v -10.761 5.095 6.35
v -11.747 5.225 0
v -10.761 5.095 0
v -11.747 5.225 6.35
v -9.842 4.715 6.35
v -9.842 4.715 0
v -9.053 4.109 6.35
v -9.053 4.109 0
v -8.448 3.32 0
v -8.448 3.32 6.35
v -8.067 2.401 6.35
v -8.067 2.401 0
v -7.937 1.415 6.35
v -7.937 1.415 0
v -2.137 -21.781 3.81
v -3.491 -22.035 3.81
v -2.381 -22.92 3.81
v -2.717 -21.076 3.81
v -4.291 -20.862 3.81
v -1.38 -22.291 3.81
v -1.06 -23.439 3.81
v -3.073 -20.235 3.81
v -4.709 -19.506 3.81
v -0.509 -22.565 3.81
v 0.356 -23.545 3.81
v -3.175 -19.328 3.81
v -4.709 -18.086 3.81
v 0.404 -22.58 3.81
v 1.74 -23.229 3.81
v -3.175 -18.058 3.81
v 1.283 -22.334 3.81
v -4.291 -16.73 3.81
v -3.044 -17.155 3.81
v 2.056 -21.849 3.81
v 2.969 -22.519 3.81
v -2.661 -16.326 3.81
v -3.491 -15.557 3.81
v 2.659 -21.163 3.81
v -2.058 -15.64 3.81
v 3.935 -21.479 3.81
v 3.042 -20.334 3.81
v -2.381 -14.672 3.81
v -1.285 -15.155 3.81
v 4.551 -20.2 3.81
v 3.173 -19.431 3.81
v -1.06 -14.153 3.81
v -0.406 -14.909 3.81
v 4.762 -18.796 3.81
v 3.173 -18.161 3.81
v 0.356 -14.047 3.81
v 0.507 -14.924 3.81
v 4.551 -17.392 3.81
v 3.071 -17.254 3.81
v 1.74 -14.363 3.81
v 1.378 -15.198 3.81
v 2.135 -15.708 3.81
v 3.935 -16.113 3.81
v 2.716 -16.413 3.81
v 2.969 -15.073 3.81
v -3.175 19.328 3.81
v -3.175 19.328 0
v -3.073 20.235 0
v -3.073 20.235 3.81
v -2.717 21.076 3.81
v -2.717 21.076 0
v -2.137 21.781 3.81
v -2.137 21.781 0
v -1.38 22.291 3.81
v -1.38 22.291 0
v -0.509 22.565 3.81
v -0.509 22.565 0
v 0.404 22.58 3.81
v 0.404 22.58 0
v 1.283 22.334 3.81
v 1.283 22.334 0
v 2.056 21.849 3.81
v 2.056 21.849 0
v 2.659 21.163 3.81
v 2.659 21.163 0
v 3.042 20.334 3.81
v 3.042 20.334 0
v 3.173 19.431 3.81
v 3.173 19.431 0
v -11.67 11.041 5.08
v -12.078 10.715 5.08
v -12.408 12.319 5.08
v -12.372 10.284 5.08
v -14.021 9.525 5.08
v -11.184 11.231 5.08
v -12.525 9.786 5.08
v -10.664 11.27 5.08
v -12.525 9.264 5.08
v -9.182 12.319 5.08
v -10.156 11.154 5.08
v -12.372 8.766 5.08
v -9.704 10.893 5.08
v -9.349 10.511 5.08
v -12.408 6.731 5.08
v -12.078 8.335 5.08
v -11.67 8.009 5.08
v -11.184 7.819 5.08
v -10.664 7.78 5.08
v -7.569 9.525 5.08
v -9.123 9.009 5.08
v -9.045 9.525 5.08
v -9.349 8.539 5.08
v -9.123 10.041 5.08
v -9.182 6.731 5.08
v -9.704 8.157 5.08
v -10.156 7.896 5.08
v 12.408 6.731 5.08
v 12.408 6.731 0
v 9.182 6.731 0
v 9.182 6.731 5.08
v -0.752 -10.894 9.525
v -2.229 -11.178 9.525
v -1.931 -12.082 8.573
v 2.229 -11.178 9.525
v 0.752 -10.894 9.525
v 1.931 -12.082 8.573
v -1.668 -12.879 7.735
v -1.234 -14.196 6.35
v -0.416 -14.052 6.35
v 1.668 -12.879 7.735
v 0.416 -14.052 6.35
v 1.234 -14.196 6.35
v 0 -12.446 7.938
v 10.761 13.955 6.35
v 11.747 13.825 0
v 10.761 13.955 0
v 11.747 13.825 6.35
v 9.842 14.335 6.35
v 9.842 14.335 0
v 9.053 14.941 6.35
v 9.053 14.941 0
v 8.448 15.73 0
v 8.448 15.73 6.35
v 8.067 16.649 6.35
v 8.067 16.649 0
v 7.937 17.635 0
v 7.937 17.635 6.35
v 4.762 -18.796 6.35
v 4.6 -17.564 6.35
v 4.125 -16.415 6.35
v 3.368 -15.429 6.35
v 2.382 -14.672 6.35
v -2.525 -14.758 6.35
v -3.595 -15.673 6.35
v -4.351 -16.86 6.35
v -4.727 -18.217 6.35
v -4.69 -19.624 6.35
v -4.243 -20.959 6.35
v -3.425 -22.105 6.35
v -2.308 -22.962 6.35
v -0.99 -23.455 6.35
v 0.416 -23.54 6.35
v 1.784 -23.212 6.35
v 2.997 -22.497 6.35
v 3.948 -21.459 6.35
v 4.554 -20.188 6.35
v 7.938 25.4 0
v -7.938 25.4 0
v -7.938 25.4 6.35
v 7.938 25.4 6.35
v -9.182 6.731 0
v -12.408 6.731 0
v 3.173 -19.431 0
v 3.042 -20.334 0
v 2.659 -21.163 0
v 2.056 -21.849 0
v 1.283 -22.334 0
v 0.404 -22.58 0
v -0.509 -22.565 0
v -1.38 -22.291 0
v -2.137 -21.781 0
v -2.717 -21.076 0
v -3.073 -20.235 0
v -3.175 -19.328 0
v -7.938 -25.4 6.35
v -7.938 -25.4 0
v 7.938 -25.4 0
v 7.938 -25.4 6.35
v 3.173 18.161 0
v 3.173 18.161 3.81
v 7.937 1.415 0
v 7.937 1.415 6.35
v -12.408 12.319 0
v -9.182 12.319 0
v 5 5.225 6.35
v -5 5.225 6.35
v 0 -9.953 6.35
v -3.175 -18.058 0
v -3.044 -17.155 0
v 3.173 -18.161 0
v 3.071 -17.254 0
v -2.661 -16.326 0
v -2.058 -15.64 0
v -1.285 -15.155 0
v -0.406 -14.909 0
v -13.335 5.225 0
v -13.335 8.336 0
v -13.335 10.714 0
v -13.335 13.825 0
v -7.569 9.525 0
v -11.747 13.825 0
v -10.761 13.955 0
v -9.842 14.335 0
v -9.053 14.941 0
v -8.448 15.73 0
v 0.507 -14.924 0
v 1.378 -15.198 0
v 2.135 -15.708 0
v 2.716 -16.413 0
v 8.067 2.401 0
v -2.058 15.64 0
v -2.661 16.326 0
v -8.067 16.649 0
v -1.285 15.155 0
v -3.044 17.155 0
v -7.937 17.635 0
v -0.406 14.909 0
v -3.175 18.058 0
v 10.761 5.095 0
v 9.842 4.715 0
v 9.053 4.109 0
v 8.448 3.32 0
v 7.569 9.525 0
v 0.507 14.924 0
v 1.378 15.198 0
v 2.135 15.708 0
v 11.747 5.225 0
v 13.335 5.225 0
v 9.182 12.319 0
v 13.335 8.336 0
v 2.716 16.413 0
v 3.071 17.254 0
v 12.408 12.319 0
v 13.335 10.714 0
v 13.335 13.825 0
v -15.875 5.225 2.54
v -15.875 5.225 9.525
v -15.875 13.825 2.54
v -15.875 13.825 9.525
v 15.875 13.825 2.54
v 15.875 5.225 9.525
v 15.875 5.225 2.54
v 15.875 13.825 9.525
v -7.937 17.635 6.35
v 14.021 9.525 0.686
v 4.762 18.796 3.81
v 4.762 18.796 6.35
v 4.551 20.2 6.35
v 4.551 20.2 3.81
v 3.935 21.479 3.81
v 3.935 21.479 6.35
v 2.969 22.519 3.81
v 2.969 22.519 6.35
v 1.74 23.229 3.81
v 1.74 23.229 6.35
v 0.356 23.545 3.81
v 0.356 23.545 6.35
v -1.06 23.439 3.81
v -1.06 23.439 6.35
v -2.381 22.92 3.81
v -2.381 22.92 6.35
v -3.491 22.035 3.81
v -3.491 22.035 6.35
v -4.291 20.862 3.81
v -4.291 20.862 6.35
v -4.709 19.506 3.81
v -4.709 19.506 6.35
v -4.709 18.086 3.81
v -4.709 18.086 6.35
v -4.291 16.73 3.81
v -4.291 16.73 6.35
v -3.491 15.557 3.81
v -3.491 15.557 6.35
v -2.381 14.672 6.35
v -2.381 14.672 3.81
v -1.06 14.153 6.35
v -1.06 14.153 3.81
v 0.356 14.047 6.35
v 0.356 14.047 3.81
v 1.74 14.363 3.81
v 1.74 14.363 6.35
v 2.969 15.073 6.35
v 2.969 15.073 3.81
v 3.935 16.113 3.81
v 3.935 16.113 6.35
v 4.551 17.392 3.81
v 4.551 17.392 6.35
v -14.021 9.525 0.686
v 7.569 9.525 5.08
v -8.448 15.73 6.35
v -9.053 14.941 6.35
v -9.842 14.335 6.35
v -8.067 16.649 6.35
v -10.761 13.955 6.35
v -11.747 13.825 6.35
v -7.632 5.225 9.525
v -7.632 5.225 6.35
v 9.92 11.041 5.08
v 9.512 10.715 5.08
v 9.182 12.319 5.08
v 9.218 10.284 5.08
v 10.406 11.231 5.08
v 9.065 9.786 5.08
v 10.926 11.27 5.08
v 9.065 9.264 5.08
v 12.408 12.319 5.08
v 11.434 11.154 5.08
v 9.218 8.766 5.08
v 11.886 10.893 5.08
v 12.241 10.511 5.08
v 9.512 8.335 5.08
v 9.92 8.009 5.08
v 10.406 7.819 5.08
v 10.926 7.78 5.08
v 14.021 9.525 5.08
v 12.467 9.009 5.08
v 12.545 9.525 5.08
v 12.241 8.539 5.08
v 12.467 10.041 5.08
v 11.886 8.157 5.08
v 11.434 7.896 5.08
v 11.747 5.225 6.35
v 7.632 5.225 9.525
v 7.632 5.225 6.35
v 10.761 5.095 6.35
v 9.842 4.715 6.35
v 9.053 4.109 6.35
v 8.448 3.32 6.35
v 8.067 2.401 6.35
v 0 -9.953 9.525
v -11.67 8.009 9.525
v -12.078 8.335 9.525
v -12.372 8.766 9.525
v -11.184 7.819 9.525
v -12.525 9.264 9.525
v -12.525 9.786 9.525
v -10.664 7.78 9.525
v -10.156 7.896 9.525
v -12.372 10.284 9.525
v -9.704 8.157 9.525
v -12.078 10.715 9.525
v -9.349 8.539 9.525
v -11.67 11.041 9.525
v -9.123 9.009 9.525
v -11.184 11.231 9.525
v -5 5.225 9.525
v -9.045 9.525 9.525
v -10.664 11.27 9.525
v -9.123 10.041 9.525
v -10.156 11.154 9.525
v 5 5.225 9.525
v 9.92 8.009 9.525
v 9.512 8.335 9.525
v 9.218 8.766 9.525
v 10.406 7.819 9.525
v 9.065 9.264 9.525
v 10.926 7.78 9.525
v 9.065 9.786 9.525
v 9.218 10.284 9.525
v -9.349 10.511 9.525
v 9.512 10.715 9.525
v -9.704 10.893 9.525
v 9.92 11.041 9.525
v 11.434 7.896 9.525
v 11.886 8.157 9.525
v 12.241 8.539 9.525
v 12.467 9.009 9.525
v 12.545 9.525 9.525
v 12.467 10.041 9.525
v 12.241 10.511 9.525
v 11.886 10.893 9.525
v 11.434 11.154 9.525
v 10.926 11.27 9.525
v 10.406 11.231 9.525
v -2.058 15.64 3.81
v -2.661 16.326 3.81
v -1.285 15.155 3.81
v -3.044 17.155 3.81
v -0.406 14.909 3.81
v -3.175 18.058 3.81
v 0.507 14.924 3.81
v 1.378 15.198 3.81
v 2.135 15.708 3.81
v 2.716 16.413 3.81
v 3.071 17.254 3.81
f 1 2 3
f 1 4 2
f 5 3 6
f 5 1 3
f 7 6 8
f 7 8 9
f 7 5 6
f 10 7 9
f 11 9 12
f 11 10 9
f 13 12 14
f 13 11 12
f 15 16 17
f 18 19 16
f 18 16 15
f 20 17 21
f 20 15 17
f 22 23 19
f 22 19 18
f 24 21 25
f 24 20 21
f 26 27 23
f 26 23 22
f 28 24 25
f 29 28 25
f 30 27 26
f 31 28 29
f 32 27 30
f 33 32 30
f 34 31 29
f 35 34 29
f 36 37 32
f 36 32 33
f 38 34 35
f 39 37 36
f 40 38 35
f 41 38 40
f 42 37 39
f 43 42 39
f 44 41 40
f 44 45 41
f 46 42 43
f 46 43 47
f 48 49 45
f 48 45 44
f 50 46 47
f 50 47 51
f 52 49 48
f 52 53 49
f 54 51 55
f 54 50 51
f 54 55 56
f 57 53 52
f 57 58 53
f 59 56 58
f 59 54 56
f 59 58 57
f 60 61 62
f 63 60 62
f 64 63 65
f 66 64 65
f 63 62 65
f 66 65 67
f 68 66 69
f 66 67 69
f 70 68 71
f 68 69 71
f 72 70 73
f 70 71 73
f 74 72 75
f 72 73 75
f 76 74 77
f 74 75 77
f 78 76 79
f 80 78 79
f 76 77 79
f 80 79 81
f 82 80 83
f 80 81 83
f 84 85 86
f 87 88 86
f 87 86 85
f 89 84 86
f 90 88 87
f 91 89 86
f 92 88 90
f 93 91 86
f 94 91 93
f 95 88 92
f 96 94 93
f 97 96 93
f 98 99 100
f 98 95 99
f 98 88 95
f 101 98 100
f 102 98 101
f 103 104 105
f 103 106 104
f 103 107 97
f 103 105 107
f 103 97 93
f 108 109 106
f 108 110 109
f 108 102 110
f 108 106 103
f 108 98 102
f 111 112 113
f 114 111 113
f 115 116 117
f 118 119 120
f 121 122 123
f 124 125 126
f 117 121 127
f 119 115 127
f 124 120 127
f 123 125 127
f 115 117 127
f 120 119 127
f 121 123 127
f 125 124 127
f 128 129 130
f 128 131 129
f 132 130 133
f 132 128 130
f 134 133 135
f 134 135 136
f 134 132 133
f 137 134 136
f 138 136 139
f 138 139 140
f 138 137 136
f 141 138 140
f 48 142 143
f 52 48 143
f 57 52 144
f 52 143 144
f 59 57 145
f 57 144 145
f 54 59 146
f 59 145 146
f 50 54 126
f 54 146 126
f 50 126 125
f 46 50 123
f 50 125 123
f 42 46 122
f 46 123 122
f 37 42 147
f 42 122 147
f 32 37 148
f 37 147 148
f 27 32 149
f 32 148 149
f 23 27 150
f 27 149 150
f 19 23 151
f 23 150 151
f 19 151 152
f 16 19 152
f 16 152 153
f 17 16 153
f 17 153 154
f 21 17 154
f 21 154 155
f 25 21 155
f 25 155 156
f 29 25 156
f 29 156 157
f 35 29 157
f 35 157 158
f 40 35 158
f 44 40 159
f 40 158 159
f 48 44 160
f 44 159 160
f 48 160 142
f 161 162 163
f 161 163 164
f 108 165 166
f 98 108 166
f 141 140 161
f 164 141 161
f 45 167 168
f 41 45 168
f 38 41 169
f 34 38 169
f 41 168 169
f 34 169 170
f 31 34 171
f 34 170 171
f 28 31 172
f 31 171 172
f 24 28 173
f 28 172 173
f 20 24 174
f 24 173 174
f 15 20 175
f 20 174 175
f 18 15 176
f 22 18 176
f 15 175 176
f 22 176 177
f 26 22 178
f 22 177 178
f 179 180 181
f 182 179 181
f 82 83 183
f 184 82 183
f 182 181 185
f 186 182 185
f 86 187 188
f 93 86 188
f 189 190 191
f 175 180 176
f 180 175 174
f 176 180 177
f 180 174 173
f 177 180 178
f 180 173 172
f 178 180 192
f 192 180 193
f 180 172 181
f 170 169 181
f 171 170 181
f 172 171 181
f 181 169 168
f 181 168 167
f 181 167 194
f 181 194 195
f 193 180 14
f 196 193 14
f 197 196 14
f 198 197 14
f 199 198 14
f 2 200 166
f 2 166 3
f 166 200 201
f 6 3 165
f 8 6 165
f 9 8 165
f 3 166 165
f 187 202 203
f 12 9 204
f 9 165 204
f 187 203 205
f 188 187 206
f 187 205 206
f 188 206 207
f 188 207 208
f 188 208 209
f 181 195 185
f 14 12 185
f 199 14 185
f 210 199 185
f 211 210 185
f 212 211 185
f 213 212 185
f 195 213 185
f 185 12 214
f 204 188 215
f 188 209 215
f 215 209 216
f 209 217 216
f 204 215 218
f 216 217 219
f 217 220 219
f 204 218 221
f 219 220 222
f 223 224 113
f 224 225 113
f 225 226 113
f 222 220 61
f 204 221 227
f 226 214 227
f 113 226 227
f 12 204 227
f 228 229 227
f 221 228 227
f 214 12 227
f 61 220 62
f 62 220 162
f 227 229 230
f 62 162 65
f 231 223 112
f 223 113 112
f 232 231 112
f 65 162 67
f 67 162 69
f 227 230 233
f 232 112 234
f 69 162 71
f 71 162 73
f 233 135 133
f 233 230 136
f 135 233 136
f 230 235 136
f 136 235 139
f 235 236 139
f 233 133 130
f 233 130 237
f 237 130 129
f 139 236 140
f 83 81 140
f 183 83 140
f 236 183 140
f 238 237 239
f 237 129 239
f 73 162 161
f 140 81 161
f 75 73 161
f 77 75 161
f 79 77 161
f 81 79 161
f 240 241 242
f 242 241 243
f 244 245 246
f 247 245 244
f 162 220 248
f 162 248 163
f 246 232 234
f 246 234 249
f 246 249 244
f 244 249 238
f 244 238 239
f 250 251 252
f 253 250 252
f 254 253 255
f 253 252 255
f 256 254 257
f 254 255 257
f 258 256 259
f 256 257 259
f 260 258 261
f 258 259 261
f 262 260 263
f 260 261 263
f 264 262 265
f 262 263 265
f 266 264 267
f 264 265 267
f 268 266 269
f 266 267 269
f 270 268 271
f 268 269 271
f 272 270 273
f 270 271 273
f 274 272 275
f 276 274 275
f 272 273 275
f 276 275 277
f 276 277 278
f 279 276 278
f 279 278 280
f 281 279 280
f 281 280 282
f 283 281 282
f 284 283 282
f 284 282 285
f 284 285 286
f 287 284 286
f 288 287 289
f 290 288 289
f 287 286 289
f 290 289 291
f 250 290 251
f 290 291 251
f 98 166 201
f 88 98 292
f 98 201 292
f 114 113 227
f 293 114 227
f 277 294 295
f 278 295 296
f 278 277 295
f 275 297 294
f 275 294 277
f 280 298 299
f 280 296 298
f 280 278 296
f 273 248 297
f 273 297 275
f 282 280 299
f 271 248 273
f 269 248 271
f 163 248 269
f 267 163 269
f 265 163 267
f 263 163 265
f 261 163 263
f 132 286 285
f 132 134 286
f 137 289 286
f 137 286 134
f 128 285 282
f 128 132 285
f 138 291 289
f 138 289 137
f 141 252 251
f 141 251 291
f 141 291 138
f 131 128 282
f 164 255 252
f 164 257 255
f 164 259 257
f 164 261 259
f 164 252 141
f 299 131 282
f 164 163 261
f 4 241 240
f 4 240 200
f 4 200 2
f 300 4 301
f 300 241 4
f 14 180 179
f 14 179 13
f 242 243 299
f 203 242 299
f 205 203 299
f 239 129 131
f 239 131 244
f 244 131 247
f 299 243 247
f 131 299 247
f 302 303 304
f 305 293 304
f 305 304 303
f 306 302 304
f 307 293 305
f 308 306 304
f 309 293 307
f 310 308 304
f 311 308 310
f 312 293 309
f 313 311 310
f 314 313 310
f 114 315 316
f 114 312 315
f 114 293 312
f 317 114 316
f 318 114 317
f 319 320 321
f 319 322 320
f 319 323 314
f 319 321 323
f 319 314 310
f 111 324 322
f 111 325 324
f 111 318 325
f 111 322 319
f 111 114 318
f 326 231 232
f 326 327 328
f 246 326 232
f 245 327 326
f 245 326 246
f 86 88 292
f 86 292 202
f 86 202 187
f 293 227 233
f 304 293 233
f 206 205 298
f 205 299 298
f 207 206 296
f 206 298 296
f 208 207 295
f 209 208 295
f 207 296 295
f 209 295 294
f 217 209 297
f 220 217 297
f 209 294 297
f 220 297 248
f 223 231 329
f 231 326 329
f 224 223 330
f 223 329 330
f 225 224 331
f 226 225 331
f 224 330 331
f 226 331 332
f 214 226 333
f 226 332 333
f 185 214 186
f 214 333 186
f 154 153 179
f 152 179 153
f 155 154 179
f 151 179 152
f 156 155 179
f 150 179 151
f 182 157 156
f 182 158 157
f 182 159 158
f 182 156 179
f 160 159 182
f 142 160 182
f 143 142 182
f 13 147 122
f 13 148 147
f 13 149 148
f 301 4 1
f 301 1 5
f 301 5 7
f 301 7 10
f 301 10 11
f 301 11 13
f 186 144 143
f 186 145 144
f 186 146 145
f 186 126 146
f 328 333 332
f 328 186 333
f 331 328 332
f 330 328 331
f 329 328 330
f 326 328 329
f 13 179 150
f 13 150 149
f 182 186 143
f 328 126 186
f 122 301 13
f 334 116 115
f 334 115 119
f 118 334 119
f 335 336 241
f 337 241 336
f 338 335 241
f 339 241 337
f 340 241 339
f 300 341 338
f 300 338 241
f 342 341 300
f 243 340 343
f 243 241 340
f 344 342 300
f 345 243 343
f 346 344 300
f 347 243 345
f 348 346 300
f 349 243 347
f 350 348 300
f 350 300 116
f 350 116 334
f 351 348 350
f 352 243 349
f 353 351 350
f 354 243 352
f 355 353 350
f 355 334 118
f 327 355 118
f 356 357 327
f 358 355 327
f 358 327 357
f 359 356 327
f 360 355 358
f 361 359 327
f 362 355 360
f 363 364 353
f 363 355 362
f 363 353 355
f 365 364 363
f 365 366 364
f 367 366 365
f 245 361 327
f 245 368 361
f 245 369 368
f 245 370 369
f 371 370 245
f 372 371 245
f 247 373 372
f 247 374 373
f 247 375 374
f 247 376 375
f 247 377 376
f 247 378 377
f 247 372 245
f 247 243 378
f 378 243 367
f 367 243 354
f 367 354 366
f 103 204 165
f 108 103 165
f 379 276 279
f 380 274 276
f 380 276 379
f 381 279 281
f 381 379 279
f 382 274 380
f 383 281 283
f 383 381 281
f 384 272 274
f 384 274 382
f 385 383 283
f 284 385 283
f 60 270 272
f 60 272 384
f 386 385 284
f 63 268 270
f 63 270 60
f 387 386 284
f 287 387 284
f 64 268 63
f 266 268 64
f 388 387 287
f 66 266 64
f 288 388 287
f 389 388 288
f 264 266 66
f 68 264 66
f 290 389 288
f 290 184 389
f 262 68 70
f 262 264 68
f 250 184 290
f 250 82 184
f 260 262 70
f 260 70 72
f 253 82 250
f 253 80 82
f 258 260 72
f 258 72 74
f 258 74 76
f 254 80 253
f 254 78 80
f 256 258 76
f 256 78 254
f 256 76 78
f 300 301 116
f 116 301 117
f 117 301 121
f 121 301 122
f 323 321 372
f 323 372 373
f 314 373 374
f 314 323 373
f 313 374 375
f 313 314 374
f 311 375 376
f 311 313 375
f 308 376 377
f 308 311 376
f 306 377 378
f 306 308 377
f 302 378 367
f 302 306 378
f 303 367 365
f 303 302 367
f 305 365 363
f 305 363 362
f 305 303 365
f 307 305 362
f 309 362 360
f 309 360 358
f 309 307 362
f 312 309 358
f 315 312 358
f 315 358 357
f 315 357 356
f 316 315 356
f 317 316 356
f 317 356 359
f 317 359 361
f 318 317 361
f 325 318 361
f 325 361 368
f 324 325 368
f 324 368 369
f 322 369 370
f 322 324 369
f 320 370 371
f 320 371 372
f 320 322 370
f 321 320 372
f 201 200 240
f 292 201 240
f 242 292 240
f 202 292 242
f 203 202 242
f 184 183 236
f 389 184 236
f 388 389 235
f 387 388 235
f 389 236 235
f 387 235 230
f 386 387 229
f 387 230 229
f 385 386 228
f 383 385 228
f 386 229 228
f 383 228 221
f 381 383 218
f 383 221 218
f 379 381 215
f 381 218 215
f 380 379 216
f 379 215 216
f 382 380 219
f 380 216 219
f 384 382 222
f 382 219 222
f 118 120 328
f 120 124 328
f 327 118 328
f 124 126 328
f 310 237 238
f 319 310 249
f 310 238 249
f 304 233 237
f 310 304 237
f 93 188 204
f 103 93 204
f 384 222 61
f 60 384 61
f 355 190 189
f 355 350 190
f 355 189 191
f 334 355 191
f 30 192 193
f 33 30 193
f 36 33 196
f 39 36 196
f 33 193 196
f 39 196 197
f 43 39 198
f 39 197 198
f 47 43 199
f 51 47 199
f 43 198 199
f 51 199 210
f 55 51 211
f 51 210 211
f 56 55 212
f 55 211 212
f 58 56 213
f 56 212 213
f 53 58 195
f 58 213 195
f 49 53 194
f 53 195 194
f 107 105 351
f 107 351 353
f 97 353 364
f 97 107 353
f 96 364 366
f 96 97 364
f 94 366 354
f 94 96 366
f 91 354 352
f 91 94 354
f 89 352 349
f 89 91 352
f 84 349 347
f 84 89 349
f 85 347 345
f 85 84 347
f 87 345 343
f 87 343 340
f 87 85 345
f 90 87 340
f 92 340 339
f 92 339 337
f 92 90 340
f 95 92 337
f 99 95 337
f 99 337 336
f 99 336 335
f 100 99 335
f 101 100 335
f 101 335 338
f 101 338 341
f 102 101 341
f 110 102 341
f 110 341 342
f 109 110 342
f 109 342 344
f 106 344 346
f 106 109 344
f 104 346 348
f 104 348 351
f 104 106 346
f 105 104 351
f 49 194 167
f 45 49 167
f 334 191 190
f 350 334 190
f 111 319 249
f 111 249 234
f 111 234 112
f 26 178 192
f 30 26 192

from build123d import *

# Parameters (mm, degrees)
F0_W          = 15.875
F0_H          = 50.8
F1_DEPTH      = 6.35
F2_W          = 31.75
F2_H          = 8.6
F2_R          = 1.75
F3_DEPTH      = 3.175
F3_DEPTH_BACK = 6.35
F4_R          = 4.7625
F5_DEPTH      = 2.54
F6_SIZE       = 2.54
F8_DEPTH      = 5.08
F9_R          = 3.81
F11_DEPTH     = 3.175
F12_SIZE      = 3.17499


# Not quite as in the source:
# - a fillet or chamfer is up to 0.001 mm smaller than in the source, because OpenCascade refuses the exact size


with BuildPart() as f1:
    # F0 (on Top) → F1 (new body)
    with BuildSketch(Plane.XY):
        Rectangle(F0_W, F0_H)
        with BuildLine():
            ThreePointArc((-3.175, -18.058110271), (0.0514516208, -14.8835271912), (3.1733324288, -18.161))
            Line((3.1733324288, -18.161), (3.1733324288, -19.431))
            ThreePointArc((3.1733324288, -19.431), (-0.053119192, -22.6055830798), (-3.175, -19.328110271))
            Line((-3.175, -19.328110271), (-3.175, -18.058110271))
        make_face(mode=Mode.SUBTRACT)
        with BuildLine():
            ThreePointArc((3.1733324288, 18.161), (0.0514516208, 14.8835271912), (-3.175, 18.058110271))
            Line((-3.175, 18.058110271), (-3.175, 19.328110271))
            ThreePointArc((-3.175, 19.328110271), (-0.053119192, 22.6055830798), (3.1733324288, 19.431))
            Line((3.1733324288, 19.431), (3.1733324288, 18.161))
        make_face(mode=Mode.SUBTRACT)
    extrude(amount=F1_DEPTH)

    # F2 (on face) → F3 (join, two sides)
    with BuildSketch(Plane.XY.offset(6.35)) as f3_sk:
        with Locations((0, 9.525)):
            Rectangle(F2_W, F2_H)
        with Locations((-10.795, 9.525)):
            Circle(F2_R, mode=Mode.SUBTRACT)
        with Locations((10.795, 9.525)):
            Circle(F2_R, mode=Mode.SUBTRACT)
    extrude(amount=F3_DEPTH)
    extrude(f3_sk.sketch, amount=-F3_DEPTH_BACK)

    # F4 (on face) → F5 (cut)
    with BuildSketch(Plane.XY.offset(6.35)):
        with Locations((0, -18.796)):
            Circle(F4_R)
        with Locations((0, 18.796)):
            Circle(F4_R)
    extrude(amount=-F5_DEPTH, mode=Mode.SUBTRACT)

    # F6
    f6_edges = [f1.edges().sort_by_distance(p)[0] for p in [
        (-15.875, 9.525, 0),
        (15.875, 9.525, 0),
    ]]
    chamfer(f6_edges, length=F6_SIZE)

    # F7 (on face) → F8 (cut)
    with BuildSketch(Plane(origin=(0, 0, 0), x_dir=(1, 0, 0), z_dir=(0, 0, -1))):
        Polygon((-9.1818833479, -12.319), (-7.5687666958, -9.525), (-9.1818833479, -6.731), (-12.4081166521, -6.731), (-14.0212333042, -9.525), (-12.4081166521, -12.319), align=None)
        Polygon((12.4081166521, -6.731), (9.1818833479, -6.731), (7.5687666958, -9.525), (9.1818833479, -12.319), (12.4081166521, -12.319), (14.0212333042, -9.525), align=None)
    extrude(amount=-F8_DEPTH, mode=Mode.SUBTRACT)

    # F9
    f9_edges = [f1.edges().sort_by_distance(p)[0] for p in [
        (-7.9375, 5.225, 3.175),
        (7.9375, 5.225, 3.175),
        (7.9375, 13.825, 3.175),
        (-7.9375, 13.825, 3.175),
    ]]
    fillet(f9_edges, radius=F9_R)

    # F10 (on face) → F11 (join, through all)
    with BuildSketch(Plane.XY.offset(6.35)):
        with BuildLine():
            Line((-5, 5.225), (-7.6321601122, 5.225))
            Line((-7.6321601122, 5.225), (-1.2342699774, -14.1962191495))
            ThreePointArc((-1.2342699774, -14.1962191495), (0, -14.0335), (1.2342699774, -14.1962191495))
            Line((1.2342699774, -14.1962191495), (7.6321601122, 5.225))
            Line((7.6321601122, 5.225), (5, 5.225))
            Line((5, 5.225), (0, -9.952831082))
            Line((0, -9.952831082), (-5, 5.225))
        make_face()
    extrude(amount=F11_DEPTH)

    # F12 (size 3.175 in the source; OpenCascade refuses exactly that, so slightly less here)
    f12_edges = [f1.edges().sort_by_distance(p)[0] for p in [
        (0, -14.0335, 9.525),
    ]]
    chamfer(f12_edges, length=F12_SIZE)


solid = f1.part
